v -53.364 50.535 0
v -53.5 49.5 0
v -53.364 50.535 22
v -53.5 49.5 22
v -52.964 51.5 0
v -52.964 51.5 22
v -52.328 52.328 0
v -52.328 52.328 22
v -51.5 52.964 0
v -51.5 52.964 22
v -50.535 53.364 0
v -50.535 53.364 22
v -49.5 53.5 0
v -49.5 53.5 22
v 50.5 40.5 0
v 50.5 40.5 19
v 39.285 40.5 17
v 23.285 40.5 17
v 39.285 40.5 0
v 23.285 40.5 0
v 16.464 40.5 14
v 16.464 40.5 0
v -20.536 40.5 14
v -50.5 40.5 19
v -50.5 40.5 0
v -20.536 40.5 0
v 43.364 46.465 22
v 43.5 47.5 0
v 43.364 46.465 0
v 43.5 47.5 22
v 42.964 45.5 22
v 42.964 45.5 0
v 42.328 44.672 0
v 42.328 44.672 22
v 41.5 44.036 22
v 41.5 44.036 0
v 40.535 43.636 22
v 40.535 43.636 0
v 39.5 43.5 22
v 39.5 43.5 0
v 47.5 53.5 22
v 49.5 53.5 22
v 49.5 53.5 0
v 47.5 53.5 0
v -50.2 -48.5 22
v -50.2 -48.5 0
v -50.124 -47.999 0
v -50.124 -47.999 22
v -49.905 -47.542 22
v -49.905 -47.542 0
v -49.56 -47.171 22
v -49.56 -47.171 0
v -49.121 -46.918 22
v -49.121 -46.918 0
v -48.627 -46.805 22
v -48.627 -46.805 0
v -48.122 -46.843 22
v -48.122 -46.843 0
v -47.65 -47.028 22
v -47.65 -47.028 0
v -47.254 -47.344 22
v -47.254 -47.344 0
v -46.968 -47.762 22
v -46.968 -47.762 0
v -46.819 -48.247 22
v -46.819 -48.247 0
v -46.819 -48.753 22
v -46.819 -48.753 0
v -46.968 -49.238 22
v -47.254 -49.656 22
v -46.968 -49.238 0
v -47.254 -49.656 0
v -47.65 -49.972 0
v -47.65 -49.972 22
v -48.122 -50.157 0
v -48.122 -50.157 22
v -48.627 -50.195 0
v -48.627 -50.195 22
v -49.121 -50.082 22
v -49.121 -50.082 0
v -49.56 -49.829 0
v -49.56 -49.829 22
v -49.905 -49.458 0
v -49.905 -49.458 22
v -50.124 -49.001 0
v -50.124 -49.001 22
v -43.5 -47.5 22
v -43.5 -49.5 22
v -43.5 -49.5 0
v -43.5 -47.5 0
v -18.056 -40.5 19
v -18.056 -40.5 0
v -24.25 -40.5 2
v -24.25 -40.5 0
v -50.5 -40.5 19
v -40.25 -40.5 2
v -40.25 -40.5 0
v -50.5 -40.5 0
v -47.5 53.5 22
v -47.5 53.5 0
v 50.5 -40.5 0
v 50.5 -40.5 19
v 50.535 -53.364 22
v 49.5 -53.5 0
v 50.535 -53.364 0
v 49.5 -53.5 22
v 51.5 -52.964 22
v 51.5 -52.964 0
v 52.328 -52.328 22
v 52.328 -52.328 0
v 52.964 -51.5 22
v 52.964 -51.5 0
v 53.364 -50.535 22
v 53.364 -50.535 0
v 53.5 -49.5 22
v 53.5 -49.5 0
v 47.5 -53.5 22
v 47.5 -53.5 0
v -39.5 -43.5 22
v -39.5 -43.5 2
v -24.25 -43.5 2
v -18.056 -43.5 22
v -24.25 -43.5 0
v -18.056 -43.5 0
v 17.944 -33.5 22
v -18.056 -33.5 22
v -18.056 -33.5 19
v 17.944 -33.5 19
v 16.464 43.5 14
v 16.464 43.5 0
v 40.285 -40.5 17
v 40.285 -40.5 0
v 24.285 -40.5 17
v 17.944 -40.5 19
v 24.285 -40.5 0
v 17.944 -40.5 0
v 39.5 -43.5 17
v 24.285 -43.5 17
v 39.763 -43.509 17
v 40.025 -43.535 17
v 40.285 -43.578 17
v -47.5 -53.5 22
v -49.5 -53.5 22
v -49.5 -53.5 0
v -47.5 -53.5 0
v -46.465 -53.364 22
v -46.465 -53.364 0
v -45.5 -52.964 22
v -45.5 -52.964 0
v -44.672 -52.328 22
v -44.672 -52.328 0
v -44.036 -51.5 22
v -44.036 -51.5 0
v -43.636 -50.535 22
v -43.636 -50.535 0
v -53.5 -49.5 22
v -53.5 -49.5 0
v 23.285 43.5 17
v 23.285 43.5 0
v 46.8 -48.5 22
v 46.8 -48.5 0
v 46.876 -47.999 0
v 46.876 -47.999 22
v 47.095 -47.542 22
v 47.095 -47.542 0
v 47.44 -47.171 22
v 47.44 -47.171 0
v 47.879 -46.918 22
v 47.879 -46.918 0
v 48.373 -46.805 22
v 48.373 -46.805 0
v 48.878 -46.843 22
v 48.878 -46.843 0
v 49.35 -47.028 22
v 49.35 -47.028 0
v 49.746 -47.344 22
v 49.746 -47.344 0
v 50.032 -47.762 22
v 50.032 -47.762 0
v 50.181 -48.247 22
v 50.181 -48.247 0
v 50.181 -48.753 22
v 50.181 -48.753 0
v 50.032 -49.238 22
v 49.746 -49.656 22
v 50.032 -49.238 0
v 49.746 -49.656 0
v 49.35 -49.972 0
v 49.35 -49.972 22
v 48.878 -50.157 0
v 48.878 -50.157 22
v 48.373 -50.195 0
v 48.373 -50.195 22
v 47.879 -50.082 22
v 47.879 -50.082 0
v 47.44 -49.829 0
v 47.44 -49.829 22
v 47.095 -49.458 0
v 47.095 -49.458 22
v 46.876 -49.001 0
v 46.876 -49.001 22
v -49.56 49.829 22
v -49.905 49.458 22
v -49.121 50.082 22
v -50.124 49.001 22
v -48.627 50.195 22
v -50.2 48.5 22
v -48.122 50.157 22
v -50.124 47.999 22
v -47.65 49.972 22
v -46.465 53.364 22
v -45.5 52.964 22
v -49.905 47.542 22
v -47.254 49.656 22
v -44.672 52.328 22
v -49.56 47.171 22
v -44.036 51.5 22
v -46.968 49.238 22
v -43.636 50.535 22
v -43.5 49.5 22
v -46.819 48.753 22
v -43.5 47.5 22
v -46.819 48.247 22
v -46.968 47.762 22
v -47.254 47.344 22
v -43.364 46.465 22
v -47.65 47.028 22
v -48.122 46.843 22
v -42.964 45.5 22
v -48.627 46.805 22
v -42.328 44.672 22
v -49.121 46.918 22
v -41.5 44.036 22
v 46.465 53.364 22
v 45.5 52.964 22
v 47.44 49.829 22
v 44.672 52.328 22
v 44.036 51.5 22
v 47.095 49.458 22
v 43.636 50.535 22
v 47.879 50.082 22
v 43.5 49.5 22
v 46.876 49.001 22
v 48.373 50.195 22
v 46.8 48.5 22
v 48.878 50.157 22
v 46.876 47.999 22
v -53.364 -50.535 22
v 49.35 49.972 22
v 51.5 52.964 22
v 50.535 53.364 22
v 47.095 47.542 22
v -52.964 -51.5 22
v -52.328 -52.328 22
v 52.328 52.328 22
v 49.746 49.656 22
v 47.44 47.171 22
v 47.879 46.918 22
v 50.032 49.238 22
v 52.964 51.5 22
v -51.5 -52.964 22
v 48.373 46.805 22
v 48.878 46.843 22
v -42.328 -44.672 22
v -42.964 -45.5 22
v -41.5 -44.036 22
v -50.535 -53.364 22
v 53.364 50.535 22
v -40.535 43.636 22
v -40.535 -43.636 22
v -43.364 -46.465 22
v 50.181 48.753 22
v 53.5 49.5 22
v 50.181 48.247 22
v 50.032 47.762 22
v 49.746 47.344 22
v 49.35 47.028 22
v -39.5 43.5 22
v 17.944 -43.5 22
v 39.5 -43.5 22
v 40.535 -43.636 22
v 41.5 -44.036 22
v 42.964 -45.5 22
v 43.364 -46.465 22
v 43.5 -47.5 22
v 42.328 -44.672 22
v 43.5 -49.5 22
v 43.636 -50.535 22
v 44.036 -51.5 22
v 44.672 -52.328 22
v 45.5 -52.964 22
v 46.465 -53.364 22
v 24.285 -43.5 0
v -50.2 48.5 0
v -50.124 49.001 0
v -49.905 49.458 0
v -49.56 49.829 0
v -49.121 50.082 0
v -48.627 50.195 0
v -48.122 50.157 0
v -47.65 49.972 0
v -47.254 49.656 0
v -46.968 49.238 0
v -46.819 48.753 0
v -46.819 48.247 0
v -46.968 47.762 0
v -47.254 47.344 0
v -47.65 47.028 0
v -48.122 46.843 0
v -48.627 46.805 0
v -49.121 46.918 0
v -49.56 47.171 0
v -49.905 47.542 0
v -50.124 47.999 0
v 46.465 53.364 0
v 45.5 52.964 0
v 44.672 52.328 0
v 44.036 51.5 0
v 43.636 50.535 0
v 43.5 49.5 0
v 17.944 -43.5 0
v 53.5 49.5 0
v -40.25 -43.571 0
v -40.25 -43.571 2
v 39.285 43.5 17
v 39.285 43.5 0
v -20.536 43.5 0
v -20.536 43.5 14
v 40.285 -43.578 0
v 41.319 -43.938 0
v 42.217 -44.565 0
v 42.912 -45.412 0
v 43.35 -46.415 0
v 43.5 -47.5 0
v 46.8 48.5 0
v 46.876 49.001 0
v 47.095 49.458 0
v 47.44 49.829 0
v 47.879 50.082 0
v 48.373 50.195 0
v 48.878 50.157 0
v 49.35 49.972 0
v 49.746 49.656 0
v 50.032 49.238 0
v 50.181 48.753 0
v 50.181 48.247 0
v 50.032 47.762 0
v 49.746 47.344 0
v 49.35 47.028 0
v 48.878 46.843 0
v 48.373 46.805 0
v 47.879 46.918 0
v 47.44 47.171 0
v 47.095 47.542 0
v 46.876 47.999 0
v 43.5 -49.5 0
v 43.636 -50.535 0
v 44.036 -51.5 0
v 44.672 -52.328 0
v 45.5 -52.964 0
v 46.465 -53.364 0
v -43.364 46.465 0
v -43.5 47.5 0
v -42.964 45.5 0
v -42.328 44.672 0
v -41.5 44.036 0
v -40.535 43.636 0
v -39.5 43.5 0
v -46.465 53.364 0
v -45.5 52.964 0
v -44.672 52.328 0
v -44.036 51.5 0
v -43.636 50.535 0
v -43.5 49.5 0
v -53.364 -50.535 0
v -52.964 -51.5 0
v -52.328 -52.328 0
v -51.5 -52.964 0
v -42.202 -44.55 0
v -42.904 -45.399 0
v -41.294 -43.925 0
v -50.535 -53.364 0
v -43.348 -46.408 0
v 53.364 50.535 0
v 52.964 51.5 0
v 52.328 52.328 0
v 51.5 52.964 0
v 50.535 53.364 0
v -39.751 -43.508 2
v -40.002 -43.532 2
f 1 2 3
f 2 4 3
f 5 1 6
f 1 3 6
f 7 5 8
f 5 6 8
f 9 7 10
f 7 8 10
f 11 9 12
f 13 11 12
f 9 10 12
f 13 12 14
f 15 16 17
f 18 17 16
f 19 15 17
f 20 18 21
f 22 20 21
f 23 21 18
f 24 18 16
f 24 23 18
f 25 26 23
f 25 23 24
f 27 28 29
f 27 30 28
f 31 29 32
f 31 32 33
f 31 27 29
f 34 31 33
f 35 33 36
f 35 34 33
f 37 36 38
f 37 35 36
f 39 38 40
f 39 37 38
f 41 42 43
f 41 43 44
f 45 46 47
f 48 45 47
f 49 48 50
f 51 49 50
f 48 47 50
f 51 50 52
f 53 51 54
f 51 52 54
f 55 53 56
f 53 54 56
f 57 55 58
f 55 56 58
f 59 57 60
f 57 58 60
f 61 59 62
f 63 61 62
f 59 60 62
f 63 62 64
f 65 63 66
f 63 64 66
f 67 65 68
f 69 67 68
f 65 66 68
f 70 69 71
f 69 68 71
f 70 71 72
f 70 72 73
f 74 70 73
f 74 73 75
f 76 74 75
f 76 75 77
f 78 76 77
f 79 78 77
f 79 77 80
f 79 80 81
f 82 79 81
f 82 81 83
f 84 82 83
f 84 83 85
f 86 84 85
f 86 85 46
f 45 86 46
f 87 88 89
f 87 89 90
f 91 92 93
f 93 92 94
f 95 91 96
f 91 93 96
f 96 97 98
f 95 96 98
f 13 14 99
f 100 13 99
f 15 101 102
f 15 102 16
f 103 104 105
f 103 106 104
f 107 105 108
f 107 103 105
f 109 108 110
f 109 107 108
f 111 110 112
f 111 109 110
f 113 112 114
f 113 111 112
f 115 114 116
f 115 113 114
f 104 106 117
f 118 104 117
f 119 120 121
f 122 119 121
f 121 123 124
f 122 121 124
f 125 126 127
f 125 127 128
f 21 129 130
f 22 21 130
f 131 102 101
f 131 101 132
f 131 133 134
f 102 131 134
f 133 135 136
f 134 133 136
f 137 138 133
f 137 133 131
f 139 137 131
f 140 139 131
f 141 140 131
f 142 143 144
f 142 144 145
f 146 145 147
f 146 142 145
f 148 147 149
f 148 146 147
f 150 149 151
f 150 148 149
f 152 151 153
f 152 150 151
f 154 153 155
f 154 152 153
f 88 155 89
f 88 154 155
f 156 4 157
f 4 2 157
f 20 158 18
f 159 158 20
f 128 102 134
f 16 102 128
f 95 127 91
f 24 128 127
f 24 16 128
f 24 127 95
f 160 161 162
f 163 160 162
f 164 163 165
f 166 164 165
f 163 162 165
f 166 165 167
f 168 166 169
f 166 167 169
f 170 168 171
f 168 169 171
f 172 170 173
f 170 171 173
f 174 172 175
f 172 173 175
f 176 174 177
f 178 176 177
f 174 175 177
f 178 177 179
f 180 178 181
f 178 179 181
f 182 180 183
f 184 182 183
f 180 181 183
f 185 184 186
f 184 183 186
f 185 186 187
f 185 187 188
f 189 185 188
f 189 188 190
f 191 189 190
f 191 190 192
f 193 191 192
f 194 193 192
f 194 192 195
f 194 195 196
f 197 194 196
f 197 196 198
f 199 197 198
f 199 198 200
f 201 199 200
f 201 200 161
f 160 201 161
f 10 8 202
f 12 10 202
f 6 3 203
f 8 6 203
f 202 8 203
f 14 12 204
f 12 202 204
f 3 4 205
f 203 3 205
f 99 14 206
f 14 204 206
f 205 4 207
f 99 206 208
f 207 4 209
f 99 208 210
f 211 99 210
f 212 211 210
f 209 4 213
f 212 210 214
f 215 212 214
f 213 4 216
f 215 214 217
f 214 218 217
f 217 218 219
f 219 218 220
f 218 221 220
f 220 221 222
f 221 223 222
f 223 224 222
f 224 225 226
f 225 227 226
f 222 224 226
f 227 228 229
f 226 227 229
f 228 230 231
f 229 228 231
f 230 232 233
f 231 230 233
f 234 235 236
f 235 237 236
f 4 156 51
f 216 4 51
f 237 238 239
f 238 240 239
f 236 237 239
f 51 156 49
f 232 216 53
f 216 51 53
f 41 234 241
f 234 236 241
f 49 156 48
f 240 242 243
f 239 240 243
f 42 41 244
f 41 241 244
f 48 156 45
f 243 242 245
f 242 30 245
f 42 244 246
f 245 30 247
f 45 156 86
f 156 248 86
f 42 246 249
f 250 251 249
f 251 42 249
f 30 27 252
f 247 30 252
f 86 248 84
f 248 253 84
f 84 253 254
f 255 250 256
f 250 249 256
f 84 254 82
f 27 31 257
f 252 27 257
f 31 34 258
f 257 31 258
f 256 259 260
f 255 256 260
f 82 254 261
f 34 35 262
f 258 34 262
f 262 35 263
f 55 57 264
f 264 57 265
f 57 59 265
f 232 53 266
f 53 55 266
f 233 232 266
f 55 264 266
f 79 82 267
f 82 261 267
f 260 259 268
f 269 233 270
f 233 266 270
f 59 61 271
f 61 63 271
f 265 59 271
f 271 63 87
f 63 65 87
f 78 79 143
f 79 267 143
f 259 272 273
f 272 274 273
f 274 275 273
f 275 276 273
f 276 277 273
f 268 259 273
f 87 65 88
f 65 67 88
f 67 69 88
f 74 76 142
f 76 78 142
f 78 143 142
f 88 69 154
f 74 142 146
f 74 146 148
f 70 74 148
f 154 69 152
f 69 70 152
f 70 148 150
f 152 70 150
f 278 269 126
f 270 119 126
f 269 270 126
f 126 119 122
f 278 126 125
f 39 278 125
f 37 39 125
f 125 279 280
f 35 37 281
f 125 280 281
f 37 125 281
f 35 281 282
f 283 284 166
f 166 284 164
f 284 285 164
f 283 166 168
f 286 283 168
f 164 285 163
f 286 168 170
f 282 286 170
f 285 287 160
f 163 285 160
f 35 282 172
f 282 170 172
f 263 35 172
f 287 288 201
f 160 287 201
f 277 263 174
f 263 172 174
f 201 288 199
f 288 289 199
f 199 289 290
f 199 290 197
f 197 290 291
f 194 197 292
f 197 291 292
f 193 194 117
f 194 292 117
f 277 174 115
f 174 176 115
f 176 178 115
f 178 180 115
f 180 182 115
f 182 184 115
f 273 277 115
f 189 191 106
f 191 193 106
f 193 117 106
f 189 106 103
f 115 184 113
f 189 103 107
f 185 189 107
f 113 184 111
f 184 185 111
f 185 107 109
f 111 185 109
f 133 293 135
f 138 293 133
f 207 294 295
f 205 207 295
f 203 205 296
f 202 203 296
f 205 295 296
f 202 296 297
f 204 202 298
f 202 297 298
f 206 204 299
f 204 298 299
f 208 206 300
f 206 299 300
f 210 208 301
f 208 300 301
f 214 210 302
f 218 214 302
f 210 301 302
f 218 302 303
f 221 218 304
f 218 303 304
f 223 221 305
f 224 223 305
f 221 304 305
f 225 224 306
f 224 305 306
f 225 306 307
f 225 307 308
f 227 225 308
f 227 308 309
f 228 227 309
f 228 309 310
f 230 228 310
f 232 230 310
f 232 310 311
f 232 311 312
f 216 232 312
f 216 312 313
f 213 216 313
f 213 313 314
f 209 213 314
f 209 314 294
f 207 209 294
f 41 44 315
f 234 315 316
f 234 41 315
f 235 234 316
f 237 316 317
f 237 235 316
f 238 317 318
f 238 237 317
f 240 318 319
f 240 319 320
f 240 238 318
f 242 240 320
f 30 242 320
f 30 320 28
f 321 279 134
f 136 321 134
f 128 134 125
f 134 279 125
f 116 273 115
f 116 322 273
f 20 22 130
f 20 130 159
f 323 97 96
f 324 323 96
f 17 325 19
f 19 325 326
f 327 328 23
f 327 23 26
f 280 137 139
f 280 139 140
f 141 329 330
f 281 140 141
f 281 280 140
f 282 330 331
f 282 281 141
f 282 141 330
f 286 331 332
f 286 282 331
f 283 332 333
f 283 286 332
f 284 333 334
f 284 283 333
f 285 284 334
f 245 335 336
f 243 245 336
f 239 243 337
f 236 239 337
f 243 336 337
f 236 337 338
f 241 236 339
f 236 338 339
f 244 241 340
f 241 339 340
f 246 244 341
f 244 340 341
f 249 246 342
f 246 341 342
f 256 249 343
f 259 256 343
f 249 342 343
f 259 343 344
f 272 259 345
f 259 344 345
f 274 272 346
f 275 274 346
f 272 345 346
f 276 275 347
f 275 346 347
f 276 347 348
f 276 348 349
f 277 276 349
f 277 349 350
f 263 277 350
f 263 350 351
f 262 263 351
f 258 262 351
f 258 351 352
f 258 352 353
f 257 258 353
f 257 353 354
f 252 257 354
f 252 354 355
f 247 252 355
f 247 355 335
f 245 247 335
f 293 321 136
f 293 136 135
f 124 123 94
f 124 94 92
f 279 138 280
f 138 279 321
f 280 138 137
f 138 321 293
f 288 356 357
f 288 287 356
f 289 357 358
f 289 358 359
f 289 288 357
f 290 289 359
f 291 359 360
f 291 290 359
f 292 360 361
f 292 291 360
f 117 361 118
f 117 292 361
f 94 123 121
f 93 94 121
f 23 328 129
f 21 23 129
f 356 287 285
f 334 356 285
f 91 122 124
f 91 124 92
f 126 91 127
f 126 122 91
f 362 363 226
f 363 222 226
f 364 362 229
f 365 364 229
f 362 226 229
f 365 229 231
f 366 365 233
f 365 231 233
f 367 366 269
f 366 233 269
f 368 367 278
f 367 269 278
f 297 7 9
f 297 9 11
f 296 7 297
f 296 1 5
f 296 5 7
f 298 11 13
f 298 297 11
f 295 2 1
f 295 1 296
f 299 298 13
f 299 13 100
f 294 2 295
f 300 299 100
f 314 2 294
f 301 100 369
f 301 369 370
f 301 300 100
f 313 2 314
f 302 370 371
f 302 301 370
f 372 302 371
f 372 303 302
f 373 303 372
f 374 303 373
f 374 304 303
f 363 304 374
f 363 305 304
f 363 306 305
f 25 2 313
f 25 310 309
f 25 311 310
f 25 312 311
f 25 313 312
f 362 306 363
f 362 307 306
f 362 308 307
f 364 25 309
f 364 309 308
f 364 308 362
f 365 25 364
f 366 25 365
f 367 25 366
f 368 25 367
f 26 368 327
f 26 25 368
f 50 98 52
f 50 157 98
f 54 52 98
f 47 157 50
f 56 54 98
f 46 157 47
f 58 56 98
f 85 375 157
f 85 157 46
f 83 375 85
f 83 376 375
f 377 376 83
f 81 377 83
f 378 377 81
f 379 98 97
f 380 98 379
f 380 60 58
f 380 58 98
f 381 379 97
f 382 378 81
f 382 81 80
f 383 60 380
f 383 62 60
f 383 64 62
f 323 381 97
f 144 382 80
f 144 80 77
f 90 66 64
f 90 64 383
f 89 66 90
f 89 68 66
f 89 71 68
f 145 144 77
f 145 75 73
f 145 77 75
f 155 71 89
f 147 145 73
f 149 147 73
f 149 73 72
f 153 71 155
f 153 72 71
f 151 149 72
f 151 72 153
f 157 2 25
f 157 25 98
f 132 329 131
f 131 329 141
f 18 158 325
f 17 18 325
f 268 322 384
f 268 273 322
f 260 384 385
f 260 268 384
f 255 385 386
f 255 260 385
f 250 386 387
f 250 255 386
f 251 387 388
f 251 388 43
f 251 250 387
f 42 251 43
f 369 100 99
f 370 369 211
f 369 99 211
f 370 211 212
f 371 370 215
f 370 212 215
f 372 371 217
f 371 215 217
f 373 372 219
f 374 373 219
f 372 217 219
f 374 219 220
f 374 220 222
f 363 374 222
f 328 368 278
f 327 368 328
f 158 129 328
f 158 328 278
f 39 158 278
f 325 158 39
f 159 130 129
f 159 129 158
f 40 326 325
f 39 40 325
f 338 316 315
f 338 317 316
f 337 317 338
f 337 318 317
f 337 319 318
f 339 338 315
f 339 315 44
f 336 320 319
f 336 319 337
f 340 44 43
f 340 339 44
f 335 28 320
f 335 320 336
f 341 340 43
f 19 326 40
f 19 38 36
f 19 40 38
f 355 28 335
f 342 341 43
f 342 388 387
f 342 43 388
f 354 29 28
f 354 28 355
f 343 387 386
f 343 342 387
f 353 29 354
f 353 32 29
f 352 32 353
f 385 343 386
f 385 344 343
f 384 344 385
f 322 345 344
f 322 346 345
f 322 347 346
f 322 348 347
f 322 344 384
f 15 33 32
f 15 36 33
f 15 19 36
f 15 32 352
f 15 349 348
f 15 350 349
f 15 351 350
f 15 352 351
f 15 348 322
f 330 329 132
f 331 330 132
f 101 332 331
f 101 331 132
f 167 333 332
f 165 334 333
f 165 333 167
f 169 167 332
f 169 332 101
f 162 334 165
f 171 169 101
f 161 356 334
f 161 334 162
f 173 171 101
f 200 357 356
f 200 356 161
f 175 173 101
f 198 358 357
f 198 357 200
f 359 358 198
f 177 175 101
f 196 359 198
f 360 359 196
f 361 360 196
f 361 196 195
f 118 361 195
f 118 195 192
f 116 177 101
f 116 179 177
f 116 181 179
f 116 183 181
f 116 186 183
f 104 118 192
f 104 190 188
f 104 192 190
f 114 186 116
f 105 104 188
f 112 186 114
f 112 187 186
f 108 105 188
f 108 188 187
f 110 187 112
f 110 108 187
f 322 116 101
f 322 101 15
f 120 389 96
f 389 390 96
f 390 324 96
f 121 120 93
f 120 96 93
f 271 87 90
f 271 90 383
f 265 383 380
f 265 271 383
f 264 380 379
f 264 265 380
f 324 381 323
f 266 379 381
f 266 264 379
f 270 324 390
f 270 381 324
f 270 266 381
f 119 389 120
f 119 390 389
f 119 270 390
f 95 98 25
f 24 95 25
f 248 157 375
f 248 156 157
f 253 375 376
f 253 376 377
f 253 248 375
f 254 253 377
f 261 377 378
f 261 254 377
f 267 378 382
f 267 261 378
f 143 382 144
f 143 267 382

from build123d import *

# Parameters (mm, degrees)
SKETCH1_W                                  = 107
SKETCH1_H                                  = 87
BOSS_EXTRUDE1_DEPTH                        = 22
SKETCH2_W                                  = 10
SKETCH2_H                                  = 10
BOSS_EXTRUDE2_DEPTH                        = 22
MIRROR1_AT_THE_SECOND_PLANE_COPY_1_SKETC_W = 10
MIRROR1_AT_THE_SECOND_PLANE_COPY_1_SKETC_H = 10
MIRROR1_AT_THE_SECOND_PLANE_COPY_1_DEPTH   = 22
SKETCH3_W                                  = 101
SKETCH3_H                                  = 81
CUT_EXTRUDE1_DEPTH                         = 19
M3_CLEARANCE_HOLE1_D                       = 3.4
CUT_EXTRUDE2_REACH                         = 114.939
SKETCH6_W                                  = 16
SKETCH6_H                                  = 17
CUT_EXTRUDE6_REACH                         = 114.939
SKETCH12_W                                 = 16
SKETCH12_H                                 = 17
CUT_EXTRUDE3_REACH                         = 114.939
SKETCH8_W                                  = 37
SKETCH8_H                                  = 14
CUT_EXTRUDE4_REACH                         = 80.794
SKETCH9_W                                  = 36
SKETCH9_H                                  = 10
FILLET1_R                                  = 4
CUT_EXTRUDE5_REACH                         = 114.939
SKETCH11_W                                 = 16
SKETCH11_H                                 = 2
CUT_EXTRUDE5_DIRECTION_2_DEPTH             = 113.939142904


with BuildPart() as part:
    # Sketch1 → Boss-Extrude1 (new body)
    with BuildSketch(Plane.XY):
        Rectangle(SKETCH1_W, SKETCH1_H)
    extrude(amount=BOSS_EXTRUDE1_DEPTH)

    # Sketch2 → Boss-Extrude2 (add)
    with BuildSketch(Plane(origin=(0, 0, 0), x_dir=(-1, 0, 0), z_dir=(0, 0, -1))):
        with Locations((-48.5, -48.5)):
            Rectangle(SKETCH2_W, SKETCH2_H)
    boss_extrude2 = extrude(amount=-BOSS_EXTRUDE2_DEPTH)

    # Mirror1: Boss-Extrude2 across plane
    add(boss_extrude2.mirror(Plane.ZX))

    # Mirror1 at the second plane: Boss-Extrude2 across plane
    add(boss_extrude2.mirror(Plane(origin=(0, 0, 0), x_dir=(0, 0, 1), z_dir=(1, 0, 0))))

    # Mirror1 at the second plane copy 1 sketc → Mirror1 at the second plane copy 1 (add)
    with BuildSketch(Plane(origin=(0, 0, 0), x_dir=(1, 0, 0), z_dir=(0, 0, -1))):
        with Locations((-48.5, -48.5)):
            Rectangle(MIRROR1_AT_THE_SECOND_PLANE_COPY_1_SKETC_W, MIRROR1_AT_THE_SECOND_PLANE_COPY_1_SKETC_H)
    extrude(amount=-MIRROR1_AT_THE_SECOND_PLANE_COPY_1_DEPTH)

    # Sketch3 → Cut-Extrude1 (cut)
    with BuildSketch(Plane(origin=(0, 0, 0), x_dir=(-1, 0, 0), z_dir=(0, 0, -1))):
        Rectangle(SKETCH3_W, SKETCH3_H)
    extrude(amount=-CUT_EXTRUDE1_DEPTH, mode=Mode.SUBTRACT)

    # M3 Clearance Hole1 (through all)
    with Locations(Plane.XY.offset(22)):
        with Locations((-48.5, -48.5), (48.5, -48.5), (48.5, 48.5), (-48.5, 48.5)):
            Hole(M3_CLEARANCE_HOLE1_D / 2)

    # Sketch6 → Cut-Extrude2 (cut, up to next)
    with BuildSketch(Plane.XZ.offset(43.5), mode=Mode.PRIVATE) as cut_extrude2_sk1:
        with Locations((32.284998939, 8.5)):
            Rectangle(SKETCH6_W, SKETCH6_H)
    cut_extrude2_tool1 = extrude(cut_extrude2_sk1.sketch, amount=-CUT_EXTRUDE2_REACH, mode=Mode.PRIVATE) & part.part
    add(cut_extrude2_tool1.solids().sort_by_distance((32.284999, -43.5, 8.5))[0], mode=Mode.SUBTRACT)

    # Sketch12 → Cut-Extrude6 (cut, up to next)
    with BuildSketch(Plane(origin=(0, 43.5, 0), x_dir=(1, 0, 0), z_dir=(0, 1, 0)), mode=Mode.PRIVATE) as cut_extrude6_sk1:
        with Locations((31.284998153, -8.5)):
            Rectangle(SKETCH12_W, SKETCH12_H)
    cut_extrude6_tool1 = extrude(cut_extrude6_sk1.sketch, amount=-CUT_EXTRUDE6_REACH, mode=Mode.PRIVATE) & part.part
    add(cut_extrude6_tool1.solids().sort_by_distance((31.284998, 43.5, 8.5))[0], mode=Mode.SUBTRACT)

    # Sketch8 → Cut-Extrude3 (cut, up to next)
    with BuildSketch(Plane(origin=(0, 43.5, 0), x_dir=(1, 0, 0), z_dir=(0, 1, 0)), mode=Mode.PRIVATE) as cut_extrude3_sk1:
        with Locations((-2.036, -7)):
            Rectangle(SKETCH8_W, SKETCH8_H)
    cut_extrude3_tool1 = extrude(cut_extrude3_sk1.sketch, amount=-CUT_EXTRUDE3_REACH, mode=Mode.PRIVATE) & part.part
    add(cut_extrude3_tool1.solids().sort_by_distance((-2.036, 43.5, 7))[0], mode=Mode.SUBTRACT)

    # Sketch9 → Cut-Extrude4 (cut, up to next)
    with BuildSketch(Plane.XY.offset(22), mode=Mode.PRIVATE) as cut_extrude4_sk1:
        with Locations((-0.055943444, -38.5)):
            Rectangle(SKETCH9_W, SKETCH9_H)
    cut_extrude4_tool1 = extrude(cut_extrude4_sk1.sketch, amount=-CUT_EXTRUDE4_REACH, mode=Mode.PRIVATE) & part.part
    add(cut_extrude4_tool1.solids().sort_by_distance((-0.055943, -38.5, 22))[0], mode=Mode.SUBTRACT)

    # Fillet1
    fillet1_edges = [part.edges().sort_by_distance(p)[0] for p in [
        (43.5, -53.5, 11),
        (43.5, -43.5, 11),
        (53.5, -53.5, 11),
        (-53.5, -53.5, 11),
        (-43.5, -53.5, 11),
        (-43.5, -43.5, 11),
        (53.5, 53.5, 11),
        (43.5, 53.5, 11),
        (43.5, 43.5, 11),
        (-43.5, 53.5, 11),
        (-43.5, 43.5, 11),
        (-53.5, 53.5, 11),
    ]]
    fillet(fillet1_edges, radius=FILLET1_R)

    # Sketch11 → Cut-Extrude5 (cut, up to next)
    with BuildSketch(Plane.XZ.offset(43.5), mode=Mode.PRIVATE) as cut_extrude5_sk1:
        with Locations((-32.249997093, 1)):
            Rectangle(SKETCH11_W, SKETCH11_H)
    cut_extrude5_tool1 = extrude(cut_extrude5_sk1.sketch, amount=-CUT_EXTRUDE5_REACH, mode=Mode.PRIVATE) & part.part
    add(cut_extrude5_tool1.solids().sort_by_distance((-32.249997, -43.5, 1))[0], mode=Mode.SUBTRACT)

    # Sketch11 → Cut-Extrude5 direction 2 (cut)
    with BuildSketch(Plane.XZ.offset(43.5)):
        with Locations((-32.249997093, 1)):
            Rectangle(SKETCH11_W, SKETCH11_H)
    extrude(amount=CUT_EXTRUDE5_DIRECTION_2_DEPTH, mode=Mode.SUBTRACT)


solid = part.part
